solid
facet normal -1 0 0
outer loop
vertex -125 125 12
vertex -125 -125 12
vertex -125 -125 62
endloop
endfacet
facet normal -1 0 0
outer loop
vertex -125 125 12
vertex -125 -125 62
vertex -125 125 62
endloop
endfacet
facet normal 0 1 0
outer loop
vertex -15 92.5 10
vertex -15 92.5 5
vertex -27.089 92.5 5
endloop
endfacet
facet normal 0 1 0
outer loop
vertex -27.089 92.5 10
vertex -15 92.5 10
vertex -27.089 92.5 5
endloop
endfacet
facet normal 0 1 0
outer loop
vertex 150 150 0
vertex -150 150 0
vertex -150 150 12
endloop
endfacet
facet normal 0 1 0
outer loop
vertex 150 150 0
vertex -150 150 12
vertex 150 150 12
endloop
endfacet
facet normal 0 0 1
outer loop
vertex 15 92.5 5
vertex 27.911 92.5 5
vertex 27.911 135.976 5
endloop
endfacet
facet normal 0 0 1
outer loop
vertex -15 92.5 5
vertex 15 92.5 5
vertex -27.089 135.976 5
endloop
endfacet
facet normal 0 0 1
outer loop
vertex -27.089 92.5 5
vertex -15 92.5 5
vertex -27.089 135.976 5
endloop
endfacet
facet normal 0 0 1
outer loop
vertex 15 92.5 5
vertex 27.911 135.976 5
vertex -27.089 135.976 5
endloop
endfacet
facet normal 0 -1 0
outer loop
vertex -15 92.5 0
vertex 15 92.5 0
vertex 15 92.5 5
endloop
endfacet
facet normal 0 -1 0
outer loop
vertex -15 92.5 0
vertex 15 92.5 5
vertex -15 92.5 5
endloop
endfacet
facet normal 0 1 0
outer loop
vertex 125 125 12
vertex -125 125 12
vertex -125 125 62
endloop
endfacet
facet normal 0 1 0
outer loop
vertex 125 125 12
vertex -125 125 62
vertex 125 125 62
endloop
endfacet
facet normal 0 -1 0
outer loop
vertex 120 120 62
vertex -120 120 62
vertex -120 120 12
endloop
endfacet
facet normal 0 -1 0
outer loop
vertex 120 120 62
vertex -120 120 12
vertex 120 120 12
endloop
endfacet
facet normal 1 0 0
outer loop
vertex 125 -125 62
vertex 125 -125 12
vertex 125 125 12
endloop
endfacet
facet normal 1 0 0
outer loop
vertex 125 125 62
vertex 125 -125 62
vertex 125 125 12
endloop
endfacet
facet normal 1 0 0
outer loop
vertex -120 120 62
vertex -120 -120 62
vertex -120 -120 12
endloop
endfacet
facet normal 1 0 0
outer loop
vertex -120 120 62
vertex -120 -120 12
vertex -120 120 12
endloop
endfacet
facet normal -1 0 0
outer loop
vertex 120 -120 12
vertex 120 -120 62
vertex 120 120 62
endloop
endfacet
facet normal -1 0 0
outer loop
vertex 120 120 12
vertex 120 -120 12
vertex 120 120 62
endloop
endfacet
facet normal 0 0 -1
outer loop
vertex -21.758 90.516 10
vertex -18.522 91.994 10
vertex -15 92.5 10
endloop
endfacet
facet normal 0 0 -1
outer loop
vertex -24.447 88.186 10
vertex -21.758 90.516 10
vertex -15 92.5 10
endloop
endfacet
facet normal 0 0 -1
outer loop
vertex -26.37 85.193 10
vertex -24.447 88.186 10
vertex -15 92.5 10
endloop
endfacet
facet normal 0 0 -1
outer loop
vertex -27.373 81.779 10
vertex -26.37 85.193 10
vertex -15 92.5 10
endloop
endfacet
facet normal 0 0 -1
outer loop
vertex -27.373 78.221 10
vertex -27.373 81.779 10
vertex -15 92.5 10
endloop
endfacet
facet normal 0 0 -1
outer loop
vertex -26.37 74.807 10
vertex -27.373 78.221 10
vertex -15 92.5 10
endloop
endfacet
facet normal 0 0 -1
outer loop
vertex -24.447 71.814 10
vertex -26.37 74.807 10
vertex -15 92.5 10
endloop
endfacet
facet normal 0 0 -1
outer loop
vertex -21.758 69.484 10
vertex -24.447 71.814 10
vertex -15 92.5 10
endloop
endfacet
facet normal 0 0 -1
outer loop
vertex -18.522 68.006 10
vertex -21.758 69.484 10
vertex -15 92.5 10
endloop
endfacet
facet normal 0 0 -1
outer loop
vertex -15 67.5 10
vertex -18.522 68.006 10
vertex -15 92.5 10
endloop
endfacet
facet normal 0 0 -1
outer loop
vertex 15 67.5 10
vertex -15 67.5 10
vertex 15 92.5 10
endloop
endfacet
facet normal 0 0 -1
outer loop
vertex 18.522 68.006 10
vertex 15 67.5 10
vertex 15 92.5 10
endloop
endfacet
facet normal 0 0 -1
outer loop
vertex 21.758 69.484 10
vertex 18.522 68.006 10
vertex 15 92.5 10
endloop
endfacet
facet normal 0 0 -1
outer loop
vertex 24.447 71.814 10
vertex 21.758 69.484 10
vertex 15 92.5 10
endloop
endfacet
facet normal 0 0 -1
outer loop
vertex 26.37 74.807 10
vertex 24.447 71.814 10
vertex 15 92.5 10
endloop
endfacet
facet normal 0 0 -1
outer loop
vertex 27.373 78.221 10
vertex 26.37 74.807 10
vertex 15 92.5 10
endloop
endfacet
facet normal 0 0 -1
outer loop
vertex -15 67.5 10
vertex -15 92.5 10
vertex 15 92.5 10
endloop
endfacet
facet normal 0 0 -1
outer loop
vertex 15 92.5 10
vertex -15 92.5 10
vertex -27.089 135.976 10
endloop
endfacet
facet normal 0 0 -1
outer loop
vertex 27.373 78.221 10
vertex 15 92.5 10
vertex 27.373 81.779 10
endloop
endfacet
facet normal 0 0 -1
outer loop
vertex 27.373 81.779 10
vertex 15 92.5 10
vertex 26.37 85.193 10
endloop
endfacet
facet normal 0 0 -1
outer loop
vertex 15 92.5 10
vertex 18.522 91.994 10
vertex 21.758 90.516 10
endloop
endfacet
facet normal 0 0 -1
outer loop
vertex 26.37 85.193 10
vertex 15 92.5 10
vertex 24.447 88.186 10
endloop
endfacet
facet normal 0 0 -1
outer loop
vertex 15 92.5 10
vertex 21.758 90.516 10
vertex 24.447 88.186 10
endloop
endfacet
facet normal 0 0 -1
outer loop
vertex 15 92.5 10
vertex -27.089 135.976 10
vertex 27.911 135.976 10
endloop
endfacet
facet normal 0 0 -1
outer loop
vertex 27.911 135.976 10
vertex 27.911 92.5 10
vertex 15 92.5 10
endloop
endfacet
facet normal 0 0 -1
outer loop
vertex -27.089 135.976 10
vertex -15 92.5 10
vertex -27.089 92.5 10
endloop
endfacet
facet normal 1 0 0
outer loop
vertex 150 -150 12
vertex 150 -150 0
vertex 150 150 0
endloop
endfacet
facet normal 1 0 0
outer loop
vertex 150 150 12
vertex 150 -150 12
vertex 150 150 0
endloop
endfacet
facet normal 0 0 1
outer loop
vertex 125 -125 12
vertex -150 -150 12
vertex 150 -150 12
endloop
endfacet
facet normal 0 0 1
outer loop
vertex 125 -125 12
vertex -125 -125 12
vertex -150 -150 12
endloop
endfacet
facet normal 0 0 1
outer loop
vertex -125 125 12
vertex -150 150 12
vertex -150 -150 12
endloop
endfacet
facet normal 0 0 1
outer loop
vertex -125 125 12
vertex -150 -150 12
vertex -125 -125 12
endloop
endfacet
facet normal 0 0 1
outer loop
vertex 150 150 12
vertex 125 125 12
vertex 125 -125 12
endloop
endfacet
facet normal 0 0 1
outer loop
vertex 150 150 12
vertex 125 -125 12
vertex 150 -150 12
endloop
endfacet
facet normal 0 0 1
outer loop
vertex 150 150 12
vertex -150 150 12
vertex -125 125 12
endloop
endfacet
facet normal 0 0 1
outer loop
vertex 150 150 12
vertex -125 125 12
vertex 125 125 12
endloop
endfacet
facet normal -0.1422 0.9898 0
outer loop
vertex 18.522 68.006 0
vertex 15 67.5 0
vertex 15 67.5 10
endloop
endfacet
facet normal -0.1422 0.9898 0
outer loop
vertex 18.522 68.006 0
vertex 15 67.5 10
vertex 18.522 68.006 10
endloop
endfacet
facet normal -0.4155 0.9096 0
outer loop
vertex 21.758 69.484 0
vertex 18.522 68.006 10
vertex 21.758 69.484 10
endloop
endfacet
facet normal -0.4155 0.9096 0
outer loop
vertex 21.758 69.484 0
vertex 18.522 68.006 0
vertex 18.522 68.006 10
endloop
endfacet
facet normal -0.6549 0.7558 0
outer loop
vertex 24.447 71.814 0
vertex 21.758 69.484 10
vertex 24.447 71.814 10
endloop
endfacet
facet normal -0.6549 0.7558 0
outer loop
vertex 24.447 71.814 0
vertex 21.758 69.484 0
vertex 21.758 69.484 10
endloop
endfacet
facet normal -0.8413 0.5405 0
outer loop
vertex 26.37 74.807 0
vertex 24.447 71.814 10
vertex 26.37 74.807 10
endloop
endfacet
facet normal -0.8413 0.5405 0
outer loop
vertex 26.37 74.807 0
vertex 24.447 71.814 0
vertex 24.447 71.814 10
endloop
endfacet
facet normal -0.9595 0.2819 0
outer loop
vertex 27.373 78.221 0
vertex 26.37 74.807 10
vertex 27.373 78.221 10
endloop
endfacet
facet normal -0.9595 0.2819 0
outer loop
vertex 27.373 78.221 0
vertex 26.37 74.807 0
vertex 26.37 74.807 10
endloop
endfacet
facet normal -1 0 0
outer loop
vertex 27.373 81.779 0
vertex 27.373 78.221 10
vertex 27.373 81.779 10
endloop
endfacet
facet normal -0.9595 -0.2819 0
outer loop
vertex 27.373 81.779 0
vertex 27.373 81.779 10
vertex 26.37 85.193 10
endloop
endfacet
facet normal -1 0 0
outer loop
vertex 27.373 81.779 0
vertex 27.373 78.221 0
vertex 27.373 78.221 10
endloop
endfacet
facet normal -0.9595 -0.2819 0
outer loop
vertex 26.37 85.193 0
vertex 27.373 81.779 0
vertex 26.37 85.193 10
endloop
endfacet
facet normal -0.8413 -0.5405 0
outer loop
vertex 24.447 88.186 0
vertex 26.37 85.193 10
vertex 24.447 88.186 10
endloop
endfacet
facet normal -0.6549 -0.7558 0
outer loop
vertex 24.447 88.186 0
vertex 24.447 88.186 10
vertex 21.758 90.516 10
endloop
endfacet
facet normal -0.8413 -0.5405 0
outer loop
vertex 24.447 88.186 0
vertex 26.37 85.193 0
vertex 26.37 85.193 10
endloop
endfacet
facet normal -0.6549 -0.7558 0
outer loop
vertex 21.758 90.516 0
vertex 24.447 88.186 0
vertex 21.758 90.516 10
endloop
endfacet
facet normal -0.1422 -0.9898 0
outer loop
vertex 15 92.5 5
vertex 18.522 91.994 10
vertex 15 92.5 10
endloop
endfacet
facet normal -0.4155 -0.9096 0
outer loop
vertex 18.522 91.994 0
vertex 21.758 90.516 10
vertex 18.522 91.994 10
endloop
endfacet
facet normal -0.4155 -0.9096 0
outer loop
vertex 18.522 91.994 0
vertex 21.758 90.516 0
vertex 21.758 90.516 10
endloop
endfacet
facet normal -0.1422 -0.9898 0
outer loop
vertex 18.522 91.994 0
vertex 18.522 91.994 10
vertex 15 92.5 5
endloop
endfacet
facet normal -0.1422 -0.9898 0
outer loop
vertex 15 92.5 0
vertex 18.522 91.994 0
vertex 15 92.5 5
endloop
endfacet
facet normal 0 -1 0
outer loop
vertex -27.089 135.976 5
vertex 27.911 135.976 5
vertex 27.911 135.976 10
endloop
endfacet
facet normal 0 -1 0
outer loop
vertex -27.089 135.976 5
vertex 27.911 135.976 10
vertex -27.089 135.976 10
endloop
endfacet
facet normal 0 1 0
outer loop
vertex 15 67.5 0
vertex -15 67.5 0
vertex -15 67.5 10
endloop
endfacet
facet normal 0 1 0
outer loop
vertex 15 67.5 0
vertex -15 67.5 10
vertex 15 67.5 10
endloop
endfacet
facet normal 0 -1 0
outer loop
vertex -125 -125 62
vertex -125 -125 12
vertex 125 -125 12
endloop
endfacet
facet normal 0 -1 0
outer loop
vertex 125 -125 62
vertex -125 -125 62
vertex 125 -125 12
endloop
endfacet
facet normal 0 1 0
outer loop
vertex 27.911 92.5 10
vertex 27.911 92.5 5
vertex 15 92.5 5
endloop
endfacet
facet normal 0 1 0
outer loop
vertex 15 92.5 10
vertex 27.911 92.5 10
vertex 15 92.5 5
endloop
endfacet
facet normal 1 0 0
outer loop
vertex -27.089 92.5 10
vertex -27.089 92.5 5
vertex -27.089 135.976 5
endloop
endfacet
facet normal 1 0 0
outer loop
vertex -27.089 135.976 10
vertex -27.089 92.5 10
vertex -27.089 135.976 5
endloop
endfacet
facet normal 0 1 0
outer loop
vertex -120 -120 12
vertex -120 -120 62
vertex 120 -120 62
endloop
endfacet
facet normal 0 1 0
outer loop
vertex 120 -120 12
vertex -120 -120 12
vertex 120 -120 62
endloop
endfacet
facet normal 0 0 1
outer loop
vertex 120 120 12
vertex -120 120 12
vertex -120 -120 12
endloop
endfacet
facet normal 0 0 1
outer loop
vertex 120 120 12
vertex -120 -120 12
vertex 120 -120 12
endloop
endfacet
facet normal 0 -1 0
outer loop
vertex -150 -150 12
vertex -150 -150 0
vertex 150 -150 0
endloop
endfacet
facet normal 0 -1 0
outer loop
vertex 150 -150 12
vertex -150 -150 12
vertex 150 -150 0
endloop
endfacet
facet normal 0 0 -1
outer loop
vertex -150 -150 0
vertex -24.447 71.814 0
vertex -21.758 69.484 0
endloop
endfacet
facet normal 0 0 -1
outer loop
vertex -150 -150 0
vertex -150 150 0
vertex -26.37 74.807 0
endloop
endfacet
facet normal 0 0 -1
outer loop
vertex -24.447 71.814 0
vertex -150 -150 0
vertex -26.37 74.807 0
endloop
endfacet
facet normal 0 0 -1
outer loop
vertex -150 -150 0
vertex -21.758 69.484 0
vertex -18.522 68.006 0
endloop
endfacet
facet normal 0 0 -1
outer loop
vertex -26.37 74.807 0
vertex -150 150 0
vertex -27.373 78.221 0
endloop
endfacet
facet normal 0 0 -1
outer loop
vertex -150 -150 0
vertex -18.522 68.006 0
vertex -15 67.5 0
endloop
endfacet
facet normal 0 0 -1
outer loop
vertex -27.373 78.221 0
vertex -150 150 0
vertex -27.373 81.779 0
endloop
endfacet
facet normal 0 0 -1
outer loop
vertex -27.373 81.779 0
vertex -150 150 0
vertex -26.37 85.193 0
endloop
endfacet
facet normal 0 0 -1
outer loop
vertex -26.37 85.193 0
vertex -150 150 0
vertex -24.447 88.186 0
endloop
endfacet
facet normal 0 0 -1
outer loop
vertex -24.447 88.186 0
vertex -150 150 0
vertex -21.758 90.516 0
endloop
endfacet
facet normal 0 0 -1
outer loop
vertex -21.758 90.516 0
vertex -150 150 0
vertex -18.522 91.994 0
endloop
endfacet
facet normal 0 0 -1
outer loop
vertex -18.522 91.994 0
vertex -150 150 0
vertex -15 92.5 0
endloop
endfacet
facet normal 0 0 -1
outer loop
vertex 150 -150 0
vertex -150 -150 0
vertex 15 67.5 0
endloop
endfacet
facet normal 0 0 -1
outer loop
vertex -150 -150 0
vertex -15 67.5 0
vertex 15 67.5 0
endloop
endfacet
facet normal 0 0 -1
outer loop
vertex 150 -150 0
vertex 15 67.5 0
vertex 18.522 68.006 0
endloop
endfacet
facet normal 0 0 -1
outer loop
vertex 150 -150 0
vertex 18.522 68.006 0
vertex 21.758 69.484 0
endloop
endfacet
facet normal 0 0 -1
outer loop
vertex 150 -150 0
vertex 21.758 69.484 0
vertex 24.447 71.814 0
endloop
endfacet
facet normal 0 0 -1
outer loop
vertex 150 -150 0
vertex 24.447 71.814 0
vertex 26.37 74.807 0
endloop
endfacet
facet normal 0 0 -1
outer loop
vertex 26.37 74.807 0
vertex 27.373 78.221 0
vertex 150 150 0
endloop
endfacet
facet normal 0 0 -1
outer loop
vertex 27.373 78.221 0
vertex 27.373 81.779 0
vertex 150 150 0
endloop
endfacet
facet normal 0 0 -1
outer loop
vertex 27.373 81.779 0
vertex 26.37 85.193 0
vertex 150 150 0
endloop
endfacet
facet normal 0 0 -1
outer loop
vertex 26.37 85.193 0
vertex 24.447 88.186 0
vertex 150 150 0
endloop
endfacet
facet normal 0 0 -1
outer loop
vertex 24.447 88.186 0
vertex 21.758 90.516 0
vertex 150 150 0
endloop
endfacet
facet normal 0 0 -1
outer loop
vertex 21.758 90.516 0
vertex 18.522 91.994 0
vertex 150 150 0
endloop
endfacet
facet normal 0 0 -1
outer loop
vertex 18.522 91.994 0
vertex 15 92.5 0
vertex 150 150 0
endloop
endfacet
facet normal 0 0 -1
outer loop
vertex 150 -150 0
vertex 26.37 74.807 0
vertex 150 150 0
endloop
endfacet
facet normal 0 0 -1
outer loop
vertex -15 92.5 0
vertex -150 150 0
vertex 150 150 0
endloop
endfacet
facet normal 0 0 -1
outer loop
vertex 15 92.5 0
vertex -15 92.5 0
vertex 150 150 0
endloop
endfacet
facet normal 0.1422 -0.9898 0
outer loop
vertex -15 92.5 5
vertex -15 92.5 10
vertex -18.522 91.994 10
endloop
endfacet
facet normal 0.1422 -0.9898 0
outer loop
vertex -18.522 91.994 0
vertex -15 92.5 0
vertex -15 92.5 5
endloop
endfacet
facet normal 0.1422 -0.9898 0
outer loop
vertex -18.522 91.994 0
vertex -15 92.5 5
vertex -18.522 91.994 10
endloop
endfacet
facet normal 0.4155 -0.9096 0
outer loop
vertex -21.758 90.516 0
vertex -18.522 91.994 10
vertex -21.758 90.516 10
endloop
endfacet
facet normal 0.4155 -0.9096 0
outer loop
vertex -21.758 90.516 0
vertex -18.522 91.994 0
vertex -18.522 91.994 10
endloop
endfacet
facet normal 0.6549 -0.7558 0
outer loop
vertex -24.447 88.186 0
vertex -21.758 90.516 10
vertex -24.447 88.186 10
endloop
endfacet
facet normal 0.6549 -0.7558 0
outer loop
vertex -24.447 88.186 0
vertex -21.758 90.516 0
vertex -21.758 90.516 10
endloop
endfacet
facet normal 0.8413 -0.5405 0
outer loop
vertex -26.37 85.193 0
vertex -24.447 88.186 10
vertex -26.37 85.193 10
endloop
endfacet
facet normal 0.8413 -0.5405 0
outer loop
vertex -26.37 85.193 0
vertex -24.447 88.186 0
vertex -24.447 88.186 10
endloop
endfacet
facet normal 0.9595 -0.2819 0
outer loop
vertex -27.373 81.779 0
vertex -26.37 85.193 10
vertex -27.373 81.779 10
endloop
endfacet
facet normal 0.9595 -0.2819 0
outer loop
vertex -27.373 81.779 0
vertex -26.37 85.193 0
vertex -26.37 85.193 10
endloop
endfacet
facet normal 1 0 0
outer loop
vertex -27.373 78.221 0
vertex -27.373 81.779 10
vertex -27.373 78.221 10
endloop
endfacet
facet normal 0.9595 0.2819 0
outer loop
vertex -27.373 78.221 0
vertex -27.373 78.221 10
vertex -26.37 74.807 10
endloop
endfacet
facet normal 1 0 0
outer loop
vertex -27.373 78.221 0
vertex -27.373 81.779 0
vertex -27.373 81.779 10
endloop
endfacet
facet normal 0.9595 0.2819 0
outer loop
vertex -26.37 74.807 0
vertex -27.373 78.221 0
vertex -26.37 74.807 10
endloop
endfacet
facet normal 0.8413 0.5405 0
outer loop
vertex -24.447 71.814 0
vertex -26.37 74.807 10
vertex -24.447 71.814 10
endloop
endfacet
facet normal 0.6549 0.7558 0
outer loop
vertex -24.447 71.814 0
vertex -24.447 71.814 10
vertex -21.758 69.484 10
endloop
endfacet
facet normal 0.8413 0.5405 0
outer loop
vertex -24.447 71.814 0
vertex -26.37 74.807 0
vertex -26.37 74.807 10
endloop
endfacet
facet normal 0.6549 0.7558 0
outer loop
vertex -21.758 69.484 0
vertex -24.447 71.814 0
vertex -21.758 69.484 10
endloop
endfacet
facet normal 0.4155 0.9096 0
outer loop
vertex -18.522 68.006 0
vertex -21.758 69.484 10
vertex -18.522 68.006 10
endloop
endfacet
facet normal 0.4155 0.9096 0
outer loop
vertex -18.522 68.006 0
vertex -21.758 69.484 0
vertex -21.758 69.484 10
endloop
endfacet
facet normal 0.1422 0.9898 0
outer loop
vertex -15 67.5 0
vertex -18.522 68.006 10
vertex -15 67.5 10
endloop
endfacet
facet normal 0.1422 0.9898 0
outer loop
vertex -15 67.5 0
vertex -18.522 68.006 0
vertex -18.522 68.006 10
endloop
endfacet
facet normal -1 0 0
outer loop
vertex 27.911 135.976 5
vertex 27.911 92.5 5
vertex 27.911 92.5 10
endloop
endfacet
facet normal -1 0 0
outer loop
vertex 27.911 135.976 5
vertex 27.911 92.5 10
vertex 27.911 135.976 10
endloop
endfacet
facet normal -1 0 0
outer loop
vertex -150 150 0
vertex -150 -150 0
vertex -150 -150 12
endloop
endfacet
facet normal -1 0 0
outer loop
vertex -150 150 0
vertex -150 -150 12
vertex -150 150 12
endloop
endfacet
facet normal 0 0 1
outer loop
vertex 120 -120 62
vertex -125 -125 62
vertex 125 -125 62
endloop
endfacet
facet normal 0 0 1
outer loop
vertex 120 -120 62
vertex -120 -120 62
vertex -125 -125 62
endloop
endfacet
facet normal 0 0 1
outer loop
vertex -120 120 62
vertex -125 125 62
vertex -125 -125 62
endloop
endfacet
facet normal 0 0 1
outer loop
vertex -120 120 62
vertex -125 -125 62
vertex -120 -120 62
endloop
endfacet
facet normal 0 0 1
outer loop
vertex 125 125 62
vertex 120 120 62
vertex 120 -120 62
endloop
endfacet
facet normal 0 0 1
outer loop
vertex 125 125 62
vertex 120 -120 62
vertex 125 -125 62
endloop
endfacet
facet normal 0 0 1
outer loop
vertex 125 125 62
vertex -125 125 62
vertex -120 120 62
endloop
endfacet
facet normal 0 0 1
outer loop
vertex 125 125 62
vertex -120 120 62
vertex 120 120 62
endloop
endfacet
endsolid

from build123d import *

# Parameters (mm, degrees)
ESQUISSE1_W             = 300
ESQUISSE1_H             = 300
BOSS_EXTRU_1_DEPTH      = 12
ESQUISSE2_W             = 250
ESQUISSE2_H             = 250
BOSS_EXTRU_2_DEPTH      = 50
ENL_V_MAT_EXTRU_1_DEPTH = 10
ENL_V_START             = -5
ESQUISSE4_W             = 55
ESQUISSE4_H             = 43.476241007
ENL_V_MAT_EXTRU_2_DEPTH = 5
ESQUISSE6_W             = 240
ESQUISSE6_H             = 240
ENL_V_MAT_EXTRU_3_DEPTH = 50


with BuildPart() as part:
    # Esquisse1 → Boss.-Extru.1 (new body)
    with BuildSketch(Plane.XY):
        Rectangle(ESQUISSE1_W, ESQUISSE1_H)
    extrude(amount=BOSS_EXTRU_1_DEPTH)

    # Esquisse2 → Boss.-Extru.2 (add)
    with BuildSketch(Plane.XY.offset(12)):
        Rectangle(ESQUISSE2_W, ESQUISSE2_H)
    extrude(amount=BOSS_EXTRU_2_DEPTH)

    # Esquisse3 → Enlèv. mat.-Extru.1 (cut)
    with BuildSketch(Plane(origin=(0, 0, 0), x_dir=(-1, 0, 0), z_dir=(0, 0, -1))):
        with BuildLine():
            Line((-15, 92.5), (15, 92.5))
            ThreePointArc((15, 92.5), (27.5, 80), (15, 67.5))
            Line((15, 67.5), (-15, 67.5))
            ThreePointArc((-15, 67.5), (-27.5, 80), (-15, 92.5))
        make_face()
    extrude(amount=-ENL_V_MAT_EXTRU_1_DEPTH, mode=Mode.SUBTRACT)

    # Esquisse4 → Enlèv. mat.-Extru.2 (cut)
    with BuildSketch(Plane(origin=(0, 0, 0), x_dir=(-1, 0, 0), z_dir=(0, 0, -1)).offset(ENL_V_START)):
        with Locations((-0.411034786, 114.238120503)):
            Rectangle(ESQUISSE4_W, ESQUISSE4_H)
    extrude(amount=-ENL_V_MAT_EXTRU_2_DEPTH, mode=Mode.SUBTRACT)

    # Esquisse6 → Enlèv. mat.-Extru.3 (cut)
    with BuildSketch(Plane.XY.offset(62)):
        Rectangle(ESQUISSE6_W, ESQUISSE6_H)
    extrude(amount=-ENL_V_MAT_EXTRU_3_DEPTH, mode=Mode.SUBTRACT)


solid = part.part
